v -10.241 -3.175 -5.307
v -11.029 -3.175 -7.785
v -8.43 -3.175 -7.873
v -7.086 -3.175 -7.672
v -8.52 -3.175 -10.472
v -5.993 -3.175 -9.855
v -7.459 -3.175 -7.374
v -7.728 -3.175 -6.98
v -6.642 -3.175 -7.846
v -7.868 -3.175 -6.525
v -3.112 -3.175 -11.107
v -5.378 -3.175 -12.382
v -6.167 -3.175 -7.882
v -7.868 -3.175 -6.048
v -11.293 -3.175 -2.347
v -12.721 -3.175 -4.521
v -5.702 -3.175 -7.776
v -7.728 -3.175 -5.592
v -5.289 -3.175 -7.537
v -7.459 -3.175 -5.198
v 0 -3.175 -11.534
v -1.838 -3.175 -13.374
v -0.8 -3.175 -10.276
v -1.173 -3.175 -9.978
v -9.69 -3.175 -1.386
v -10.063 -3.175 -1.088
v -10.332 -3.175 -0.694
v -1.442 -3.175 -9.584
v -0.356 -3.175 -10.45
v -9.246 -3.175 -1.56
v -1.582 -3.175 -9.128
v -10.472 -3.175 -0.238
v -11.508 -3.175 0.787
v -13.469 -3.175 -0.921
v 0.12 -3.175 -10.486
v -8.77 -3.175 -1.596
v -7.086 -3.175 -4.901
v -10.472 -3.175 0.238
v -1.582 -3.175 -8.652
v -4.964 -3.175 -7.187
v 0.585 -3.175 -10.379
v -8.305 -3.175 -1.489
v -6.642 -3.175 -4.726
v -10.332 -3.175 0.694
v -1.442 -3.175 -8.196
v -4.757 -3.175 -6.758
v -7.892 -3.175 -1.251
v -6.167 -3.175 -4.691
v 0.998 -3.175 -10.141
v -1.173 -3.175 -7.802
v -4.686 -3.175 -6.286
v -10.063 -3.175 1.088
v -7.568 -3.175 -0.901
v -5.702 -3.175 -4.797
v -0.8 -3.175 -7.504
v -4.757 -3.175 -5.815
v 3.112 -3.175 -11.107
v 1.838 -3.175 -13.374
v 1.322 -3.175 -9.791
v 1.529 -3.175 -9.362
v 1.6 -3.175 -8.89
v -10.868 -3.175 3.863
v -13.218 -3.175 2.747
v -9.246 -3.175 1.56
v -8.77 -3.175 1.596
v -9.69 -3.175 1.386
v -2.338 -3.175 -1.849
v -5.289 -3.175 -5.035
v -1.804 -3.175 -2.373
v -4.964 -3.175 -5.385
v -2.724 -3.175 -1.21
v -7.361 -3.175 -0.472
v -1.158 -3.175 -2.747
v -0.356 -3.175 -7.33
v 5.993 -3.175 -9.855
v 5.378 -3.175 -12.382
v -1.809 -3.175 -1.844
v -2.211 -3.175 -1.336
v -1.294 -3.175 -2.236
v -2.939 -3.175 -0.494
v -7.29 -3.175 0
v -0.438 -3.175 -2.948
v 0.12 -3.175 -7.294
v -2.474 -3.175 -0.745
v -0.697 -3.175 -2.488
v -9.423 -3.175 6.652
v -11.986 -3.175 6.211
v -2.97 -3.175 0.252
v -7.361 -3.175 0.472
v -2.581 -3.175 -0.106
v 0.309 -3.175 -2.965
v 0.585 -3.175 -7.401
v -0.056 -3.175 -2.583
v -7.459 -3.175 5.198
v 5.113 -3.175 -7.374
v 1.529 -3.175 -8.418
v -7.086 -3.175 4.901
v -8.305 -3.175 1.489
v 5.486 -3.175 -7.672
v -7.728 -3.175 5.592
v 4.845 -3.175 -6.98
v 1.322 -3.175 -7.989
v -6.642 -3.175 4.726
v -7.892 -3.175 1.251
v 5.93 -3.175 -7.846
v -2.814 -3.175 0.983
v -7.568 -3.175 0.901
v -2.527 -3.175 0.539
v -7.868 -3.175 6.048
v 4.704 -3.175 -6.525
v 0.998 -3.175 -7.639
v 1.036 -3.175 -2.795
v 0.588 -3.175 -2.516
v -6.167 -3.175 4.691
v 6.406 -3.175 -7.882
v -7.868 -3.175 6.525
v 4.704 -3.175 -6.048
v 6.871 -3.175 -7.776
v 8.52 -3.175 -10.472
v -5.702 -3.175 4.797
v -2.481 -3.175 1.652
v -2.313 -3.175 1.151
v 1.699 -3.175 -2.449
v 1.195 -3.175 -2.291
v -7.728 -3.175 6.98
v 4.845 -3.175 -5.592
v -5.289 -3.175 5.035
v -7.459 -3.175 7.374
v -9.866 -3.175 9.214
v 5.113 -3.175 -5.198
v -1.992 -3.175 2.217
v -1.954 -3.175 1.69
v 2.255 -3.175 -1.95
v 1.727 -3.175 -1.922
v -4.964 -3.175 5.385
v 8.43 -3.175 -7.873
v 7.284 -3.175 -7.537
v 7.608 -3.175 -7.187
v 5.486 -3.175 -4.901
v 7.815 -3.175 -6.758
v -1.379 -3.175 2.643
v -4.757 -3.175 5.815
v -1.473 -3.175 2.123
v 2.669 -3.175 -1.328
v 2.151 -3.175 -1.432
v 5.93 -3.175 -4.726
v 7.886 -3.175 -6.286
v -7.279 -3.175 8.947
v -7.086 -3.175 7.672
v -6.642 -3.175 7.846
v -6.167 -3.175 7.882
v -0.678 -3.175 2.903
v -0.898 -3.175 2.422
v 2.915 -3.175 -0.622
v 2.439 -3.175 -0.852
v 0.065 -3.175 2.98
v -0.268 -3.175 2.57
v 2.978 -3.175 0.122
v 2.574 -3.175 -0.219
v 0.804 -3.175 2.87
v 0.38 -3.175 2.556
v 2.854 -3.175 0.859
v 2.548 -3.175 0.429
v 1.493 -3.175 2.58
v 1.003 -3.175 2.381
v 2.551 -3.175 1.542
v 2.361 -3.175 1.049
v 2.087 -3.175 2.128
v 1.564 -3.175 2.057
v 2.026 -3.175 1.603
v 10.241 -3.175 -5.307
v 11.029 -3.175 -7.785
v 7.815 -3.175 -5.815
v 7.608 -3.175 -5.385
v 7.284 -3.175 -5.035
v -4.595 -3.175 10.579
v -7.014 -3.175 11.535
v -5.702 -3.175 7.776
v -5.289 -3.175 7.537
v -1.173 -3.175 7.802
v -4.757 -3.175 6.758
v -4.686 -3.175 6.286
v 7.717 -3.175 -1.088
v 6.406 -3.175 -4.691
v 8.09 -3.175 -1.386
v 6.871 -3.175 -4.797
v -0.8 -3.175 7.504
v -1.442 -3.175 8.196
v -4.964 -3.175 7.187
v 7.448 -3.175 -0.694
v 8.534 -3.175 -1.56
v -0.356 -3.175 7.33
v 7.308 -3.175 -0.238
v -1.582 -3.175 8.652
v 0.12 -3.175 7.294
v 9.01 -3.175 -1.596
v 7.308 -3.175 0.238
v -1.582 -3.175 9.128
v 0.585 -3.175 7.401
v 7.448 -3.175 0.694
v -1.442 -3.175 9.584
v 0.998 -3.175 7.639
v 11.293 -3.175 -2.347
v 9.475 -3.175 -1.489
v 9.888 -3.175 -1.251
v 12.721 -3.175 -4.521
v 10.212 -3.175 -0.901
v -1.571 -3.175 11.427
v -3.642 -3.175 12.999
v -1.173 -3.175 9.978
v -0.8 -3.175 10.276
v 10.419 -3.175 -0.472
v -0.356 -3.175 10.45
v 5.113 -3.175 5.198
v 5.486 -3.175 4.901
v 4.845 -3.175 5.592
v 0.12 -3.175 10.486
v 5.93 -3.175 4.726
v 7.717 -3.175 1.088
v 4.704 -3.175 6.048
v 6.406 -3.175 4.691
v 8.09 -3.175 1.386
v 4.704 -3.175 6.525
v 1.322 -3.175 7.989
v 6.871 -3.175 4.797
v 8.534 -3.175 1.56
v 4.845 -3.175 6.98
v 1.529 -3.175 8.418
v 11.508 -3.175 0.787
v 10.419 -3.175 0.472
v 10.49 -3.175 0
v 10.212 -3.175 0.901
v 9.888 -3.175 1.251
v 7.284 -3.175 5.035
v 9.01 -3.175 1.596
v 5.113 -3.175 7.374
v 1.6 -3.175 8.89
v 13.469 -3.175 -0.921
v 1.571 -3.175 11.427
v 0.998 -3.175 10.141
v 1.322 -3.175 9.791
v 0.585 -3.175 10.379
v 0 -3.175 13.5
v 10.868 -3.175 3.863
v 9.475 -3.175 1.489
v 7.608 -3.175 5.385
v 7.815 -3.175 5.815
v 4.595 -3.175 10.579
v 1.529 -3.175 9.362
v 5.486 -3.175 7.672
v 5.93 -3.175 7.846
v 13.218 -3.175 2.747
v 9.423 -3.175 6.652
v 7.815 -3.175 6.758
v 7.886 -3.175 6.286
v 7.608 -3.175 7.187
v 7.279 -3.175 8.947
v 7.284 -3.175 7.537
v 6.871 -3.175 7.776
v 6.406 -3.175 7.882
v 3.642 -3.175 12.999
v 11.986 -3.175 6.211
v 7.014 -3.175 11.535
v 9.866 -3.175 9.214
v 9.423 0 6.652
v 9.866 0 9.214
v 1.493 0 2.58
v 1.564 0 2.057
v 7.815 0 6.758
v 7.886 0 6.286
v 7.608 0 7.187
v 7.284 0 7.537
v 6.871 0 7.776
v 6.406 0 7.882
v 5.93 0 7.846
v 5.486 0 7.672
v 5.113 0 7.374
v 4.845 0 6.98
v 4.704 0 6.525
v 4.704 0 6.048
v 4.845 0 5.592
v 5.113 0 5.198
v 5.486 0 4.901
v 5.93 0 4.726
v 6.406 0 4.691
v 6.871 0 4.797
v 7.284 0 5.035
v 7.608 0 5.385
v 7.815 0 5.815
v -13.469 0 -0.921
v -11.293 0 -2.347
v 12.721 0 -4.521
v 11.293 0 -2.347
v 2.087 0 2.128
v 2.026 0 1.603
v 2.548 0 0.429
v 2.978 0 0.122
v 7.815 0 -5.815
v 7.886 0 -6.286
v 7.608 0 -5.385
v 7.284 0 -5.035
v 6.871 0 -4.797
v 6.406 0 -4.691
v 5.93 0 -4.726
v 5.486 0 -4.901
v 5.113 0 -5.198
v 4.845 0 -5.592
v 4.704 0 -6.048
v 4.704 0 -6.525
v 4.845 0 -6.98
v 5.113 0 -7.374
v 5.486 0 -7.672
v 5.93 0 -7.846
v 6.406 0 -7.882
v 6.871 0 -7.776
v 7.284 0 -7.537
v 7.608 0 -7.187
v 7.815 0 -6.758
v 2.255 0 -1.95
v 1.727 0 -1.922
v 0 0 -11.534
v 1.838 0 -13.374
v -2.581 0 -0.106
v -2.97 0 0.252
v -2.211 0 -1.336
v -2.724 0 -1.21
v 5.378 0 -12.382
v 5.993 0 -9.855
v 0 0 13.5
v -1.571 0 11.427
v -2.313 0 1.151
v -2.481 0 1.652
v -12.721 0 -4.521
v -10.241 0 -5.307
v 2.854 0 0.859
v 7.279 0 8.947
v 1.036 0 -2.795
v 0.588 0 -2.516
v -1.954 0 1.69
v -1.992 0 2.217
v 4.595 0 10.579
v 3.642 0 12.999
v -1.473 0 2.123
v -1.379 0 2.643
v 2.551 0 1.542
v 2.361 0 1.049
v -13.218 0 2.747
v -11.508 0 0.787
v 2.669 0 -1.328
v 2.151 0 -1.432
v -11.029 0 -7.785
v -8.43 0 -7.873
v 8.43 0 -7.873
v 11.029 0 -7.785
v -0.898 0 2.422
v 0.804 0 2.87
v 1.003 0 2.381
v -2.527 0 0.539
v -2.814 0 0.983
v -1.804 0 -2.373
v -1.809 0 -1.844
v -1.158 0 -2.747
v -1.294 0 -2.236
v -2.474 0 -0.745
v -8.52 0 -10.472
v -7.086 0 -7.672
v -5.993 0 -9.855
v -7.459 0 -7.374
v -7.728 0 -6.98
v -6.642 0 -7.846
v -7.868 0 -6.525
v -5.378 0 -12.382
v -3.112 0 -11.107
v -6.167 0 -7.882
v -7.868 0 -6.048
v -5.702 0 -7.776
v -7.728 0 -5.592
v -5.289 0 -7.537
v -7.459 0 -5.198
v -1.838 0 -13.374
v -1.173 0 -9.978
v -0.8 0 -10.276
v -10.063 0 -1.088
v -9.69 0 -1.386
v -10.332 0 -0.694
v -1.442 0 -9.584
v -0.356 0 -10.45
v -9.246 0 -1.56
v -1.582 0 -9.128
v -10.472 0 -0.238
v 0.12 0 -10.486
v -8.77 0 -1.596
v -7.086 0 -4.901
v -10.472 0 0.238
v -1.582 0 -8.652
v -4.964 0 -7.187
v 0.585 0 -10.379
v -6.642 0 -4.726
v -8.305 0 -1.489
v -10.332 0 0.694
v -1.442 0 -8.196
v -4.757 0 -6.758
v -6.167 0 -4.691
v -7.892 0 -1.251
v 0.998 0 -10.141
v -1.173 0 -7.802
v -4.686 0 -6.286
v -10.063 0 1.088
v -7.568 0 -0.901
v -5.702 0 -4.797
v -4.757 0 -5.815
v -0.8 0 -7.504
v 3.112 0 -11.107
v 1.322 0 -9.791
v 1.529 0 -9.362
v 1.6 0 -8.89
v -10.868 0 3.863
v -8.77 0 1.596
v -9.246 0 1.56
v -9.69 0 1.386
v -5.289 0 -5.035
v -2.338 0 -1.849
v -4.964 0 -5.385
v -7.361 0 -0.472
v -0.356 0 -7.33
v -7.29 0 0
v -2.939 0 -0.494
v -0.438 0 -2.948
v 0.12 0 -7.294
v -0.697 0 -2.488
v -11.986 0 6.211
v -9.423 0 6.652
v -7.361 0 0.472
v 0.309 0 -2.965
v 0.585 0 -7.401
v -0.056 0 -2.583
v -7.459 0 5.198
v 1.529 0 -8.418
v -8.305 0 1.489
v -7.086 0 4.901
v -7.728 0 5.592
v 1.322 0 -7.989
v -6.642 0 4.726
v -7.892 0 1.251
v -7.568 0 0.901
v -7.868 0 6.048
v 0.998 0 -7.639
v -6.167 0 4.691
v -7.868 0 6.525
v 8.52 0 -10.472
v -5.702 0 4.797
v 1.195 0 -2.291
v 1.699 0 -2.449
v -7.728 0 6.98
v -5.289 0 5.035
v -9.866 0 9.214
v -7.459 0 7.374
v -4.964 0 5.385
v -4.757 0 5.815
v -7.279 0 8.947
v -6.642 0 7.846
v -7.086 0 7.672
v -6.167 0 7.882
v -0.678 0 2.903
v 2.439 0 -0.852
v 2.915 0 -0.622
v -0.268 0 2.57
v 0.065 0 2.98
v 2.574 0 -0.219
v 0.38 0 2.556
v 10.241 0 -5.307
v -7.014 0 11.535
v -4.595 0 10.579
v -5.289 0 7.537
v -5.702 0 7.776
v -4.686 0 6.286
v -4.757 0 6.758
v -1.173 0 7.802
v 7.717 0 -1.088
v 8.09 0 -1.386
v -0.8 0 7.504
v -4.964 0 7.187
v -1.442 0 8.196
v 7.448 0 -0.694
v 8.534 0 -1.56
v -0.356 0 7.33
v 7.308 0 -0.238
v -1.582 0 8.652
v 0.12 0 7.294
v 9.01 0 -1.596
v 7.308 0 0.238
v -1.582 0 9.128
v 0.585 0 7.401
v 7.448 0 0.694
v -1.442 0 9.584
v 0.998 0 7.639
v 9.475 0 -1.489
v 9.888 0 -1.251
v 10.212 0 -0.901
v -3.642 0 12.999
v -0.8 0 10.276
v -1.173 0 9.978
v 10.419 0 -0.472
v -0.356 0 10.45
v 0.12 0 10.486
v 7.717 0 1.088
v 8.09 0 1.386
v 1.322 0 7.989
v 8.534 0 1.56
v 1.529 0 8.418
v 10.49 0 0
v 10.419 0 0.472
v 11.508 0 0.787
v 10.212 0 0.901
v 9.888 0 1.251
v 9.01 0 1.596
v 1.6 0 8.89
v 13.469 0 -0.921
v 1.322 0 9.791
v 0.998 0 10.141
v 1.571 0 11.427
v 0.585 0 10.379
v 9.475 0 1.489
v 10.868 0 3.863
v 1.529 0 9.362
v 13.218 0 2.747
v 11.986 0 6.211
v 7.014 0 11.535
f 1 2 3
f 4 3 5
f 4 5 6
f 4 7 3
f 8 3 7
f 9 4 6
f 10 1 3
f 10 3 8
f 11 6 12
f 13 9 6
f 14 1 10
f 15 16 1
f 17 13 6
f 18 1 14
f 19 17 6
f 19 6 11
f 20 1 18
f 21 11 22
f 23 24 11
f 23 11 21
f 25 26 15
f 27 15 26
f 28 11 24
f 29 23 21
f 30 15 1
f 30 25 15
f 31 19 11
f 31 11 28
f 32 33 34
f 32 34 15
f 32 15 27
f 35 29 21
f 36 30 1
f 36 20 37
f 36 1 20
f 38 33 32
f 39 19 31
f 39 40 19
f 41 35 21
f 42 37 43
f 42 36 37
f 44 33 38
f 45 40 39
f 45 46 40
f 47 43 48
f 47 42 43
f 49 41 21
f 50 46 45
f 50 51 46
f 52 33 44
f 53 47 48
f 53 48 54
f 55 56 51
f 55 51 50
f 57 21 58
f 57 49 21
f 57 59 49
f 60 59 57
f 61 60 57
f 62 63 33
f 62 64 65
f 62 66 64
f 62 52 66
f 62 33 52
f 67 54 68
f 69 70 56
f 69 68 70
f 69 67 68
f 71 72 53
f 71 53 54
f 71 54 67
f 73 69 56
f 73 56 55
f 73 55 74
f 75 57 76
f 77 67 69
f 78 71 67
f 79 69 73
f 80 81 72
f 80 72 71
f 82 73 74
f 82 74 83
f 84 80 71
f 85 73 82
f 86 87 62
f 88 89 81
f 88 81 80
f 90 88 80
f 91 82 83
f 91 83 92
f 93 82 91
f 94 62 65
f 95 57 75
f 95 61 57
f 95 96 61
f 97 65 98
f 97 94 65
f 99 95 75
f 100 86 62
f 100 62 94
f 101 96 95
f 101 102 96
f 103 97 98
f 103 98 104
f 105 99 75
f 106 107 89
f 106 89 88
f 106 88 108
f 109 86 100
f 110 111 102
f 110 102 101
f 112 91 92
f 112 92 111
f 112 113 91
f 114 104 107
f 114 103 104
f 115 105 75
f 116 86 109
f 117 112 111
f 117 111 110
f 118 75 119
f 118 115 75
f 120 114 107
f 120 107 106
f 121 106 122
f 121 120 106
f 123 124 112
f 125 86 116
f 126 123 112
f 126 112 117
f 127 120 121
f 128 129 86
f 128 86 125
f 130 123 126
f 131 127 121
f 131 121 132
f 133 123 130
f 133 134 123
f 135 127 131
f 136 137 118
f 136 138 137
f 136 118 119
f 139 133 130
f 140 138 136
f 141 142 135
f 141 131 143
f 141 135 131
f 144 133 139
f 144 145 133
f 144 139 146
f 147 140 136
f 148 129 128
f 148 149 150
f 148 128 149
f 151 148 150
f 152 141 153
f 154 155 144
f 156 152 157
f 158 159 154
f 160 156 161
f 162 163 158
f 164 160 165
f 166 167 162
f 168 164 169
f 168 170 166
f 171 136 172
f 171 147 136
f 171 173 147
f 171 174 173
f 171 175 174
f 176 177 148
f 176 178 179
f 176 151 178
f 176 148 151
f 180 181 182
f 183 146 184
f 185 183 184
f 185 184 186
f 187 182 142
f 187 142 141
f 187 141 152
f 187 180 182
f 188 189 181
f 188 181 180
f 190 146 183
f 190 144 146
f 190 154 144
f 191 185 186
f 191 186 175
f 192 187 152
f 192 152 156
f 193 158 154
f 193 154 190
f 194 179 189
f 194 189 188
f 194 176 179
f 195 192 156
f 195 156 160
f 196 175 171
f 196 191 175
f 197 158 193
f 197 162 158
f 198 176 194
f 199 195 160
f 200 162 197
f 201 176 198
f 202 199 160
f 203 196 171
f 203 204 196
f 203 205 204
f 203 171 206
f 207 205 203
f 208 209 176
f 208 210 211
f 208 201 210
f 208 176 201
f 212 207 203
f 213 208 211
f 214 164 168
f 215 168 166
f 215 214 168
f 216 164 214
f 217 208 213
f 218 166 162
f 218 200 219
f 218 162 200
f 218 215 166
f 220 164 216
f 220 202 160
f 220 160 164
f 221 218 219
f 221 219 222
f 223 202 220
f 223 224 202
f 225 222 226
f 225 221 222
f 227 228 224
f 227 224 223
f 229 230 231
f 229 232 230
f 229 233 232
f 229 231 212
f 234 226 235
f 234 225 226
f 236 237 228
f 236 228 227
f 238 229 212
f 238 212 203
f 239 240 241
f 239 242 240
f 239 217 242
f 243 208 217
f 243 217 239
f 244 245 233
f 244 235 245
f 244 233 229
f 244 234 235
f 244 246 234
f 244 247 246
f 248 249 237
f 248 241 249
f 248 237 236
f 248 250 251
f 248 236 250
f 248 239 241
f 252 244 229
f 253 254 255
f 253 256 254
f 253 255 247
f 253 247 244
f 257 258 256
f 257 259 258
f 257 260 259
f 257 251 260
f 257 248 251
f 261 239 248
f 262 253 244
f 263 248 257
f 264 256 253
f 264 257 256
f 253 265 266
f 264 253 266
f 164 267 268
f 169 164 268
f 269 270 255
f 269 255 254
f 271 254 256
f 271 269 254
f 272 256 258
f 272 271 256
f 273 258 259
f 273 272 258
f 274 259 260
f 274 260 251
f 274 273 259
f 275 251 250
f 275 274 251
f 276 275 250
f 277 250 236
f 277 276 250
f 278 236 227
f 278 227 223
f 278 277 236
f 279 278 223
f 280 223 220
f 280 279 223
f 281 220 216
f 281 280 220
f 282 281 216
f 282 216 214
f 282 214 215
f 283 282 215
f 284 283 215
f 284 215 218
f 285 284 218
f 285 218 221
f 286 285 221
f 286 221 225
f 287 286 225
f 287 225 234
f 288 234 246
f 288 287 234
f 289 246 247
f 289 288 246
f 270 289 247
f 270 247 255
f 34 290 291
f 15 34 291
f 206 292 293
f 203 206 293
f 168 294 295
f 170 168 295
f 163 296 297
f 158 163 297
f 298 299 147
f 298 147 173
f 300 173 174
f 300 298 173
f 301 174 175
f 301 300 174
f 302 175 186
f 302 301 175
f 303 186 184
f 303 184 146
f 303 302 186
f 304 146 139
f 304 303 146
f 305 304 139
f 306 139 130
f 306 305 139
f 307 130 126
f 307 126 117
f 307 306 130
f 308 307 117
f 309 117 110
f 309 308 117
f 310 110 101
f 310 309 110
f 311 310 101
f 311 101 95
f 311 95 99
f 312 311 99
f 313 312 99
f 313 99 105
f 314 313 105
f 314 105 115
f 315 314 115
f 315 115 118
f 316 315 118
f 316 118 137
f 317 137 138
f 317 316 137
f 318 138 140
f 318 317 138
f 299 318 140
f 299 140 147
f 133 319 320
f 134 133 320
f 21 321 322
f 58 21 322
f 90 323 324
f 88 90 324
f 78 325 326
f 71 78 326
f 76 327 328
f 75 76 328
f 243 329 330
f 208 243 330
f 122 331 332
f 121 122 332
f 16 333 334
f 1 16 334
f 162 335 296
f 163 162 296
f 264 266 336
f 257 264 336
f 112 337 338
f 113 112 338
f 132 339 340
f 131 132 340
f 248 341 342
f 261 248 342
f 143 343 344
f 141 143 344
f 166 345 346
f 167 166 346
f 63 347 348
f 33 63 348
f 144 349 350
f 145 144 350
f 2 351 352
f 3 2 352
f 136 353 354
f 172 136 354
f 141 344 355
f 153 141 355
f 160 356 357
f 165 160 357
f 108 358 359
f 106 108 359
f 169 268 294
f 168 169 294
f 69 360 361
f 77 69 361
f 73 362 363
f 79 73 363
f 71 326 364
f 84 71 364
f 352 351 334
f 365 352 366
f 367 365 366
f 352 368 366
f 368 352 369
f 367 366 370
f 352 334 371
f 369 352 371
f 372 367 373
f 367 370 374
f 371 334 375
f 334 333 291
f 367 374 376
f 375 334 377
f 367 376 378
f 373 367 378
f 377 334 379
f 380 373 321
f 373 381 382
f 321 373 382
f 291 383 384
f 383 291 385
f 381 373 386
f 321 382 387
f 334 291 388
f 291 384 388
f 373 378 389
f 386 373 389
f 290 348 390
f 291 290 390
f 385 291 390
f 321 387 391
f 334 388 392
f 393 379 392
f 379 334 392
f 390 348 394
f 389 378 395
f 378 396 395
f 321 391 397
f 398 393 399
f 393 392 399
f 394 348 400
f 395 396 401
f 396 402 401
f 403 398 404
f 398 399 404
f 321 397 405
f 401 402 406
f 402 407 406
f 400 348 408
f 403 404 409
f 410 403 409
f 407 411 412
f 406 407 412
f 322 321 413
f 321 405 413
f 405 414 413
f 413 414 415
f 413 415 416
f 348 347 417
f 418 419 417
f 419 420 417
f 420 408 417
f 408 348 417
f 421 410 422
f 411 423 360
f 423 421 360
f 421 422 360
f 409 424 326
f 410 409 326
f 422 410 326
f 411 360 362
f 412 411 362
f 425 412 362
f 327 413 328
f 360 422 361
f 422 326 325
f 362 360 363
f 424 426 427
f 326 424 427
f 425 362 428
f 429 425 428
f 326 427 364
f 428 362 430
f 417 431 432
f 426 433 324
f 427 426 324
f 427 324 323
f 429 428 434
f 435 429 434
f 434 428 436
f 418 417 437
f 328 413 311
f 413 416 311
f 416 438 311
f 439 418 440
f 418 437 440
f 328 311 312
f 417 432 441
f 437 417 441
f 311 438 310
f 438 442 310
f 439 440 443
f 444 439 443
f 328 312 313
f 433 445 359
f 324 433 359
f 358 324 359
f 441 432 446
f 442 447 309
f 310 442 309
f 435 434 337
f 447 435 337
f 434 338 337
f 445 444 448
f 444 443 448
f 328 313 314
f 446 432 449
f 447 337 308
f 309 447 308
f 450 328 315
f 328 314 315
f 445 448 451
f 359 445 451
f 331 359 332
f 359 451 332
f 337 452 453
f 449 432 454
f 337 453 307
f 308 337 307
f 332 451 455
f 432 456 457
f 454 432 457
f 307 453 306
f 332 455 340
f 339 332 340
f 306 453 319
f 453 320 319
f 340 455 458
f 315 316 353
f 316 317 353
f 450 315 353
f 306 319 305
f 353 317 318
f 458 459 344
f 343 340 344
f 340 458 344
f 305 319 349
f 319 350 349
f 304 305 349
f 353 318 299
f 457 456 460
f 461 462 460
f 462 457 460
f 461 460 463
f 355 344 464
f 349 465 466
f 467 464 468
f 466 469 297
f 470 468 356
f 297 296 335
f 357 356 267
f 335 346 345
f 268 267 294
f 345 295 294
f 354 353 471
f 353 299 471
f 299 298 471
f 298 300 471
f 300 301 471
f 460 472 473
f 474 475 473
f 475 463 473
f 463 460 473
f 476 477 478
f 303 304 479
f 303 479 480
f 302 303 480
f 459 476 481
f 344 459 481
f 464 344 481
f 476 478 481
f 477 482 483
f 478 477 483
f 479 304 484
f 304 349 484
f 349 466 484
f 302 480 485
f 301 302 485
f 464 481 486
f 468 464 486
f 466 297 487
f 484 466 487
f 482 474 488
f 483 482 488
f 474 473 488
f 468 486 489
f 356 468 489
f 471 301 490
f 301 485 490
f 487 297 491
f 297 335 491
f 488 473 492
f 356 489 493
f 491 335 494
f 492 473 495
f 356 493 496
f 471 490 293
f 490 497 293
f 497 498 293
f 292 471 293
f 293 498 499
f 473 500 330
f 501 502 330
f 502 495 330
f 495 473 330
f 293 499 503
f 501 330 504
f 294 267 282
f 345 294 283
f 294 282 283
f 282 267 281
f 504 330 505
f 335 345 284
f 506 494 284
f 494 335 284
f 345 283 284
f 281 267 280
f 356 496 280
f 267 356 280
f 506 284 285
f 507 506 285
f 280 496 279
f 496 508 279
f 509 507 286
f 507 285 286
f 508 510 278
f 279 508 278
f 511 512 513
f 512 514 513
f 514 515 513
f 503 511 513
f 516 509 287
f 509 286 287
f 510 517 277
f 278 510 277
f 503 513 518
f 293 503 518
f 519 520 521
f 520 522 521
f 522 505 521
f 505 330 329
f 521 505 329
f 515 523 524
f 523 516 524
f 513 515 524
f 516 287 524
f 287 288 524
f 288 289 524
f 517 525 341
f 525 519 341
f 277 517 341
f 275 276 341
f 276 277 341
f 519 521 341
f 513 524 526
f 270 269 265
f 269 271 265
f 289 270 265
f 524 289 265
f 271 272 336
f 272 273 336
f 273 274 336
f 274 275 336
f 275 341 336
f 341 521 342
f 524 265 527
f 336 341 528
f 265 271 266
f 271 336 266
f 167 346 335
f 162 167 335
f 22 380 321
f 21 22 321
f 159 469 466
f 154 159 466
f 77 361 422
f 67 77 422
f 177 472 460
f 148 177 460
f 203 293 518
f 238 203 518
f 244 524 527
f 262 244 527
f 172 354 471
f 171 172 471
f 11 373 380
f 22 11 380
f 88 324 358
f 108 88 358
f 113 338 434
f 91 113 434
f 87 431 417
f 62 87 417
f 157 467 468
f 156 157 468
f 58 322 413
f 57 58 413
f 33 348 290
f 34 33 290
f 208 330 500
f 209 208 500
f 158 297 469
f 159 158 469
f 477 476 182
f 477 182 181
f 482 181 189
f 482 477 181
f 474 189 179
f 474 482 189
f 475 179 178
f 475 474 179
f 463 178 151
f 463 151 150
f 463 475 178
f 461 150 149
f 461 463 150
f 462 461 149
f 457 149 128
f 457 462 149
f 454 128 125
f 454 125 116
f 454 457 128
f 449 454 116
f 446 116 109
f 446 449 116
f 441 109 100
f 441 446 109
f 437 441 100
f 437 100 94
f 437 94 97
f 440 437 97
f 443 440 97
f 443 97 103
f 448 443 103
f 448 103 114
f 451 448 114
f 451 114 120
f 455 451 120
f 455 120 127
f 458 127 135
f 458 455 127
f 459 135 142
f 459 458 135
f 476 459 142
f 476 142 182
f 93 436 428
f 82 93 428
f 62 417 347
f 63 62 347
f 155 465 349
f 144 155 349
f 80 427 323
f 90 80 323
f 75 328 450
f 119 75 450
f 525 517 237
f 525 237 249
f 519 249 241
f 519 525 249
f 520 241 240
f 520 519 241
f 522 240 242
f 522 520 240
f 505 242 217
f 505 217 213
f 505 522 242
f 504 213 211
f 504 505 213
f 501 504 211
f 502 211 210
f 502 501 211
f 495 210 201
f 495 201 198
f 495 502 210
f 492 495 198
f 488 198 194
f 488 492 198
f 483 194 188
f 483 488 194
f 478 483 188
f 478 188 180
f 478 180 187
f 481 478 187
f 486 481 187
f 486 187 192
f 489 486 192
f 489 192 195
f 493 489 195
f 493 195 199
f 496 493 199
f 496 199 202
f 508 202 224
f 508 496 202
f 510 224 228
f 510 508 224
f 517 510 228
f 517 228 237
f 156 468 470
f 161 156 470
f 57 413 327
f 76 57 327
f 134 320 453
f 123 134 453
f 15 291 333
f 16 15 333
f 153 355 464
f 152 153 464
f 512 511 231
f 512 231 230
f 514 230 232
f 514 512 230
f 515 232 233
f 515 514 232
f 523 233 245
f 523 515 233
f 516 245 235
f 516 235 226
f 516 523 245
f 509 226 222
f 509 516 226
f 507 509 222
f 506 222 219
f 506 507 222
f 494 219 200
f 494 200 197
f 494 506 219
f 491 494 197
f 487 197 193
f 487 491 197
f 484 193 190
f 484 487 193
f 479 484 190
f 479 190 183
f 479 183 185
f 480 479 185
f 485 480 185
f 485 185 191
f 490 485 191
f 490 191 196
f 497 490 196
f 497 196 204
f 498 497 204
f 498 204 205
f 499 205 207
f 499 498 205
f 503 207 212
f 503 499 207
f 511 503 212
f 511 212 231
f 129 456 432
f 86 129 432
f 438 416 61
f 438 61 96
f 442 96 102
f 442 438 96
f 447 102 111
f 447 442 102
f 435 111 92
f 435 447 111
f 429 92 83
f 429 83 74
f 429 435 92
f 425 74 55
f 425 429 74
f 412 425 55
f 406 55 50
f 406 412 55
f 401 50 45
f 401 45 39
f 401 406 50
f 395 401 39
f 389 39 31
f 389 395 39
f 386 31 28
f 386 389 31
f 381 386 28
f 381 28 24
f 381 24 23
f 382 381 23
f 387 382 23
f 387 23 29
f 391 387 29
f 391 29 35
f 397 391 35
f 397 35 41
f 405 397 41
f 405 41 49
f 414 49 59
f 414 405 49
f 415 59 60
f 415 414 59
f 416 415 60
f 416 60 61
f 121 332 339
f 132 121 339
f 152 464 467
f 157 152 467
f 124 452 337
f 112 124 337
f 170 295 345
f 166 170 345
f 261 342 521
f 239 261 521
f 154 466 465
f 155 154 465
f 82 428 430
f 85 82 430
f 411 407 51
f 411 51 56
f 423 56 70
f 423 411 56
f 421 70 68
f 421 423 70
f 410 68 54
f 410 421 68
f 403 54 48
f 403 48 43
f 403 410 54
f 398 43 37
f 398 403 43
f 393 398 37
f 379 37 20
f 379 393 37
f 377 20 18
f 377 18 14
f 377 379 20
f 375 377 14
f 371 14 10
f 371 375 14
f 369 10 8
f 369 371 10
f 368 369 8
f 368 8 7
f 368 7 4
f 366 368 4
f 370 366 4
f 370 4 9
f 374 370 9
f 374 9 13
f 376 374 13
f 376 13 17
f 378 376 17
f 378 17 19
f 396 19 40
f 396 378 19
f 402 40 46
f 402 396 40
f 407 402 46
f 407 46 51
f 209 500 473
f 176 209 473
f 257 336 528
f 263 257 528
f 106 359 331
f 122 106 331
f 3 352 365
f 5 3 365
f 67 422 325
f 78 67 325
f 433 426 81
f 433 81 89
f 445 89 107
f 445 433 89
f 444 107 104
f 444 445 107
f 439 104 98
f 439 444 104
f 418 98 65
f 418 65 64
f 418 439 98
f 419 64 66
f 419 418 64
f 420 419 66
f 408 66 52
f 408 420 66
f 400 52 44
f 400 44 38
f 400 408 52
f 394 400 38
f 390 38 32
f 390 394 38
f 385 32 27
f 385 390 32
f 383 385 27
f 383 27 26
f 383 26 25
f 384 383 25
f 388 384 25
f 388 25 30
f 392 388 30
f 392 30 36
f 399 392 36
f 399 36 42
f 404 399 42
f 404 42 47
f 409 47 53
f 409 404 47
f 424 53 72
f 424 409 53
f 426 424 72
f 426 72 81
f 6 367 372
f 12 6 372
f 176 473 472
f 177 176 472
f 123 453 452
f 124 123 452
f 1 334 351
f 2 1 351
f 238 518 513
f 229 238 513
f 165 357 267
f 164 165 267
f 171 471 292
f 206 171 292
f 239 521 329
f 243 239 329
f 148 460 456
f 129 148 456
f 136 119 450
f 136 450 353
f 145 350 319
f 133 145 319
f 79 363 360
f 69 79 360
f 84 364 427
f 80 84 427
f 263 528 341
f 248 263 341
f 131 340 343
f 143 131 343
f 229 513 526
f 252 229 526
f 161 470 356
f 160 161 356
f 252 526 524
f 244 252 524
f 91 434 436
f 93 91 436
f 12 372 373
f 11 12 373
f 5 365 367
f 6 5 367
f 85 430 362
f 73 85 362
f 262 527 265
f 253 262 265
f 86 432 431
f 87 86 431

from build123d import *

# Parameters (mm, degrees)
F0_R     = 1.6
F1_DEPTH = 3.175


with BuildPart() as f1:
    # F0 (on Front) → F1 (new body)
    with BuildSketch(Plane.XZ):
        Polygon((1.570599, 11.426958), (0, 13.5), (-1.570599, 11.426958), (-3.642256, 12.999383), (-4.595314, 10.579473), (-7.014383, 11.534662), (-7.279214, 8.947356), (-9.866286, 9.214467), (-9.423249, 6.651656), (-11.98645, 6.210878), (-10.868405, 3.862632), (-13.217635, 2.746656), (-11.507501, 0.787135), (-13.468528, -0.921273), (-11.293138, -2.346741), (-12.720522, -4.520875), (-10.241214, -5.30657), (-11.029094, -7.785184), (-8.429747, -7.872834), (-8.519687, -10.472102), (-5.993084, -9.855207), (-5.378415, -12.382353), (-3.111941, -11.106663), (-1.83825, -13.37426), (0, -11.53439), (1.83825, -13.37426), (3.111941, -11.106663), (5.378415, -12.382353), (5.993084, -9.855207), (8.519687, -10.472102), (8.429747, -7.872834), (11.029094, -7.785184), (10.241214, -5.30657), (12.720522, -4.520875), (11.293138, -2.346741), (13.468528, -0.921273), (11.507501, 0.787135), (13.217635, 2.746656), (10.868405, 3.862632), (11.98645, 6.210878), (9.423249, 6.651656), (9.866286, 9.214467), (7.279214, 8.947356), (7.014383, 11.534662), (4.595314, 10.579473), (3.642256, 12.999383), align=None)
        with Locations((-8.89, 0)):
            Circle(F0_R, mode=Mode.SUBTRACT)
        with Locations((-6.286179, -6.286179)):
            Circle(F0_R, mode=Mode.SUBTRACT)
        with Locations((0, -8.89)):
            Circle(F0_R, mode=Mode.SUBTRACT)
        with Locations((6.286179, -6.286179)):
            Circle(F0_R, mode=Mode.SUBTRACT)
        Polygon((-2.313127, 1.150841), (-2.481189, 1.651718), (-1.954254, 1.689937), (-1.992473, 2.216873), (-1.472587, 2.122848), (-1.378562, 2.642733), (-0.898392, 2.422372), (-0.678031, 2.902541), (-0.267748, 2.56969), (0.065104, 2.979972), (0.37972, 2.555544), (0.804147, 2.87016), (1.003328, 2.380825), (1.492663, 2.580005), (1.563894, 2.056509), (2.08739, 2.12774), (2.026194, 1.602976), (2.550958, 1.54178), (2.361181, 1.048721), (2.85424, 0.858945), (2.547807, 0.428572), (2.97818, 0.122139), (2.574344, -0.218506), (2.914989, -0.622342), (2.439126, -0.851855), (2.668639, -1.327718), (2.150649, -1.431678), (2.254609, -1.949669), (1.727038, -1.921544), (1.698914, -2.449115), (1.194912, -2.290672), (1.036469, -2.794674), (0.587704, -2.515869), (0.308899, -2.964634), (-0.056431, -2.582985), (-0.43808, -2.948314), (-0.69702, -2.487802), (-1.157533, -2.746742), (-1.293813, -2.236301), (-1.804254, -2.372581), (-1.809311, -1.844285), (-2.337607, -1.849342), (-2.211123, -1.336386), (-2.724079, -1.209903), (-2.474002, -0.744517), (-2.939388, -0.494441), (-2.581431, -0.105868), (-2.970004, 0.252089), (-2.526659, 0.539434), (-2.814004, 0.982779), align=None, mode=Mode.SUBTRACT)
        with Locations((8.89, 0)):
            Circle(F0_R, mode=Mode.SUBTRACT)
        with Locations((-6.286179, 6.286179)):
            Circle(F0_R, mode=Mode.SUBTRACT)
        with Locations((6.286179, 6.286179)):
            Circle(F0_R, mode=Mode.SUBTRACT)
        with Locations((0, 8.89)):
            Circle(F0_R, mode=Mode.SUBTRACT)
    extrude(amount=F1_DEPTH)


solid = f1.part
